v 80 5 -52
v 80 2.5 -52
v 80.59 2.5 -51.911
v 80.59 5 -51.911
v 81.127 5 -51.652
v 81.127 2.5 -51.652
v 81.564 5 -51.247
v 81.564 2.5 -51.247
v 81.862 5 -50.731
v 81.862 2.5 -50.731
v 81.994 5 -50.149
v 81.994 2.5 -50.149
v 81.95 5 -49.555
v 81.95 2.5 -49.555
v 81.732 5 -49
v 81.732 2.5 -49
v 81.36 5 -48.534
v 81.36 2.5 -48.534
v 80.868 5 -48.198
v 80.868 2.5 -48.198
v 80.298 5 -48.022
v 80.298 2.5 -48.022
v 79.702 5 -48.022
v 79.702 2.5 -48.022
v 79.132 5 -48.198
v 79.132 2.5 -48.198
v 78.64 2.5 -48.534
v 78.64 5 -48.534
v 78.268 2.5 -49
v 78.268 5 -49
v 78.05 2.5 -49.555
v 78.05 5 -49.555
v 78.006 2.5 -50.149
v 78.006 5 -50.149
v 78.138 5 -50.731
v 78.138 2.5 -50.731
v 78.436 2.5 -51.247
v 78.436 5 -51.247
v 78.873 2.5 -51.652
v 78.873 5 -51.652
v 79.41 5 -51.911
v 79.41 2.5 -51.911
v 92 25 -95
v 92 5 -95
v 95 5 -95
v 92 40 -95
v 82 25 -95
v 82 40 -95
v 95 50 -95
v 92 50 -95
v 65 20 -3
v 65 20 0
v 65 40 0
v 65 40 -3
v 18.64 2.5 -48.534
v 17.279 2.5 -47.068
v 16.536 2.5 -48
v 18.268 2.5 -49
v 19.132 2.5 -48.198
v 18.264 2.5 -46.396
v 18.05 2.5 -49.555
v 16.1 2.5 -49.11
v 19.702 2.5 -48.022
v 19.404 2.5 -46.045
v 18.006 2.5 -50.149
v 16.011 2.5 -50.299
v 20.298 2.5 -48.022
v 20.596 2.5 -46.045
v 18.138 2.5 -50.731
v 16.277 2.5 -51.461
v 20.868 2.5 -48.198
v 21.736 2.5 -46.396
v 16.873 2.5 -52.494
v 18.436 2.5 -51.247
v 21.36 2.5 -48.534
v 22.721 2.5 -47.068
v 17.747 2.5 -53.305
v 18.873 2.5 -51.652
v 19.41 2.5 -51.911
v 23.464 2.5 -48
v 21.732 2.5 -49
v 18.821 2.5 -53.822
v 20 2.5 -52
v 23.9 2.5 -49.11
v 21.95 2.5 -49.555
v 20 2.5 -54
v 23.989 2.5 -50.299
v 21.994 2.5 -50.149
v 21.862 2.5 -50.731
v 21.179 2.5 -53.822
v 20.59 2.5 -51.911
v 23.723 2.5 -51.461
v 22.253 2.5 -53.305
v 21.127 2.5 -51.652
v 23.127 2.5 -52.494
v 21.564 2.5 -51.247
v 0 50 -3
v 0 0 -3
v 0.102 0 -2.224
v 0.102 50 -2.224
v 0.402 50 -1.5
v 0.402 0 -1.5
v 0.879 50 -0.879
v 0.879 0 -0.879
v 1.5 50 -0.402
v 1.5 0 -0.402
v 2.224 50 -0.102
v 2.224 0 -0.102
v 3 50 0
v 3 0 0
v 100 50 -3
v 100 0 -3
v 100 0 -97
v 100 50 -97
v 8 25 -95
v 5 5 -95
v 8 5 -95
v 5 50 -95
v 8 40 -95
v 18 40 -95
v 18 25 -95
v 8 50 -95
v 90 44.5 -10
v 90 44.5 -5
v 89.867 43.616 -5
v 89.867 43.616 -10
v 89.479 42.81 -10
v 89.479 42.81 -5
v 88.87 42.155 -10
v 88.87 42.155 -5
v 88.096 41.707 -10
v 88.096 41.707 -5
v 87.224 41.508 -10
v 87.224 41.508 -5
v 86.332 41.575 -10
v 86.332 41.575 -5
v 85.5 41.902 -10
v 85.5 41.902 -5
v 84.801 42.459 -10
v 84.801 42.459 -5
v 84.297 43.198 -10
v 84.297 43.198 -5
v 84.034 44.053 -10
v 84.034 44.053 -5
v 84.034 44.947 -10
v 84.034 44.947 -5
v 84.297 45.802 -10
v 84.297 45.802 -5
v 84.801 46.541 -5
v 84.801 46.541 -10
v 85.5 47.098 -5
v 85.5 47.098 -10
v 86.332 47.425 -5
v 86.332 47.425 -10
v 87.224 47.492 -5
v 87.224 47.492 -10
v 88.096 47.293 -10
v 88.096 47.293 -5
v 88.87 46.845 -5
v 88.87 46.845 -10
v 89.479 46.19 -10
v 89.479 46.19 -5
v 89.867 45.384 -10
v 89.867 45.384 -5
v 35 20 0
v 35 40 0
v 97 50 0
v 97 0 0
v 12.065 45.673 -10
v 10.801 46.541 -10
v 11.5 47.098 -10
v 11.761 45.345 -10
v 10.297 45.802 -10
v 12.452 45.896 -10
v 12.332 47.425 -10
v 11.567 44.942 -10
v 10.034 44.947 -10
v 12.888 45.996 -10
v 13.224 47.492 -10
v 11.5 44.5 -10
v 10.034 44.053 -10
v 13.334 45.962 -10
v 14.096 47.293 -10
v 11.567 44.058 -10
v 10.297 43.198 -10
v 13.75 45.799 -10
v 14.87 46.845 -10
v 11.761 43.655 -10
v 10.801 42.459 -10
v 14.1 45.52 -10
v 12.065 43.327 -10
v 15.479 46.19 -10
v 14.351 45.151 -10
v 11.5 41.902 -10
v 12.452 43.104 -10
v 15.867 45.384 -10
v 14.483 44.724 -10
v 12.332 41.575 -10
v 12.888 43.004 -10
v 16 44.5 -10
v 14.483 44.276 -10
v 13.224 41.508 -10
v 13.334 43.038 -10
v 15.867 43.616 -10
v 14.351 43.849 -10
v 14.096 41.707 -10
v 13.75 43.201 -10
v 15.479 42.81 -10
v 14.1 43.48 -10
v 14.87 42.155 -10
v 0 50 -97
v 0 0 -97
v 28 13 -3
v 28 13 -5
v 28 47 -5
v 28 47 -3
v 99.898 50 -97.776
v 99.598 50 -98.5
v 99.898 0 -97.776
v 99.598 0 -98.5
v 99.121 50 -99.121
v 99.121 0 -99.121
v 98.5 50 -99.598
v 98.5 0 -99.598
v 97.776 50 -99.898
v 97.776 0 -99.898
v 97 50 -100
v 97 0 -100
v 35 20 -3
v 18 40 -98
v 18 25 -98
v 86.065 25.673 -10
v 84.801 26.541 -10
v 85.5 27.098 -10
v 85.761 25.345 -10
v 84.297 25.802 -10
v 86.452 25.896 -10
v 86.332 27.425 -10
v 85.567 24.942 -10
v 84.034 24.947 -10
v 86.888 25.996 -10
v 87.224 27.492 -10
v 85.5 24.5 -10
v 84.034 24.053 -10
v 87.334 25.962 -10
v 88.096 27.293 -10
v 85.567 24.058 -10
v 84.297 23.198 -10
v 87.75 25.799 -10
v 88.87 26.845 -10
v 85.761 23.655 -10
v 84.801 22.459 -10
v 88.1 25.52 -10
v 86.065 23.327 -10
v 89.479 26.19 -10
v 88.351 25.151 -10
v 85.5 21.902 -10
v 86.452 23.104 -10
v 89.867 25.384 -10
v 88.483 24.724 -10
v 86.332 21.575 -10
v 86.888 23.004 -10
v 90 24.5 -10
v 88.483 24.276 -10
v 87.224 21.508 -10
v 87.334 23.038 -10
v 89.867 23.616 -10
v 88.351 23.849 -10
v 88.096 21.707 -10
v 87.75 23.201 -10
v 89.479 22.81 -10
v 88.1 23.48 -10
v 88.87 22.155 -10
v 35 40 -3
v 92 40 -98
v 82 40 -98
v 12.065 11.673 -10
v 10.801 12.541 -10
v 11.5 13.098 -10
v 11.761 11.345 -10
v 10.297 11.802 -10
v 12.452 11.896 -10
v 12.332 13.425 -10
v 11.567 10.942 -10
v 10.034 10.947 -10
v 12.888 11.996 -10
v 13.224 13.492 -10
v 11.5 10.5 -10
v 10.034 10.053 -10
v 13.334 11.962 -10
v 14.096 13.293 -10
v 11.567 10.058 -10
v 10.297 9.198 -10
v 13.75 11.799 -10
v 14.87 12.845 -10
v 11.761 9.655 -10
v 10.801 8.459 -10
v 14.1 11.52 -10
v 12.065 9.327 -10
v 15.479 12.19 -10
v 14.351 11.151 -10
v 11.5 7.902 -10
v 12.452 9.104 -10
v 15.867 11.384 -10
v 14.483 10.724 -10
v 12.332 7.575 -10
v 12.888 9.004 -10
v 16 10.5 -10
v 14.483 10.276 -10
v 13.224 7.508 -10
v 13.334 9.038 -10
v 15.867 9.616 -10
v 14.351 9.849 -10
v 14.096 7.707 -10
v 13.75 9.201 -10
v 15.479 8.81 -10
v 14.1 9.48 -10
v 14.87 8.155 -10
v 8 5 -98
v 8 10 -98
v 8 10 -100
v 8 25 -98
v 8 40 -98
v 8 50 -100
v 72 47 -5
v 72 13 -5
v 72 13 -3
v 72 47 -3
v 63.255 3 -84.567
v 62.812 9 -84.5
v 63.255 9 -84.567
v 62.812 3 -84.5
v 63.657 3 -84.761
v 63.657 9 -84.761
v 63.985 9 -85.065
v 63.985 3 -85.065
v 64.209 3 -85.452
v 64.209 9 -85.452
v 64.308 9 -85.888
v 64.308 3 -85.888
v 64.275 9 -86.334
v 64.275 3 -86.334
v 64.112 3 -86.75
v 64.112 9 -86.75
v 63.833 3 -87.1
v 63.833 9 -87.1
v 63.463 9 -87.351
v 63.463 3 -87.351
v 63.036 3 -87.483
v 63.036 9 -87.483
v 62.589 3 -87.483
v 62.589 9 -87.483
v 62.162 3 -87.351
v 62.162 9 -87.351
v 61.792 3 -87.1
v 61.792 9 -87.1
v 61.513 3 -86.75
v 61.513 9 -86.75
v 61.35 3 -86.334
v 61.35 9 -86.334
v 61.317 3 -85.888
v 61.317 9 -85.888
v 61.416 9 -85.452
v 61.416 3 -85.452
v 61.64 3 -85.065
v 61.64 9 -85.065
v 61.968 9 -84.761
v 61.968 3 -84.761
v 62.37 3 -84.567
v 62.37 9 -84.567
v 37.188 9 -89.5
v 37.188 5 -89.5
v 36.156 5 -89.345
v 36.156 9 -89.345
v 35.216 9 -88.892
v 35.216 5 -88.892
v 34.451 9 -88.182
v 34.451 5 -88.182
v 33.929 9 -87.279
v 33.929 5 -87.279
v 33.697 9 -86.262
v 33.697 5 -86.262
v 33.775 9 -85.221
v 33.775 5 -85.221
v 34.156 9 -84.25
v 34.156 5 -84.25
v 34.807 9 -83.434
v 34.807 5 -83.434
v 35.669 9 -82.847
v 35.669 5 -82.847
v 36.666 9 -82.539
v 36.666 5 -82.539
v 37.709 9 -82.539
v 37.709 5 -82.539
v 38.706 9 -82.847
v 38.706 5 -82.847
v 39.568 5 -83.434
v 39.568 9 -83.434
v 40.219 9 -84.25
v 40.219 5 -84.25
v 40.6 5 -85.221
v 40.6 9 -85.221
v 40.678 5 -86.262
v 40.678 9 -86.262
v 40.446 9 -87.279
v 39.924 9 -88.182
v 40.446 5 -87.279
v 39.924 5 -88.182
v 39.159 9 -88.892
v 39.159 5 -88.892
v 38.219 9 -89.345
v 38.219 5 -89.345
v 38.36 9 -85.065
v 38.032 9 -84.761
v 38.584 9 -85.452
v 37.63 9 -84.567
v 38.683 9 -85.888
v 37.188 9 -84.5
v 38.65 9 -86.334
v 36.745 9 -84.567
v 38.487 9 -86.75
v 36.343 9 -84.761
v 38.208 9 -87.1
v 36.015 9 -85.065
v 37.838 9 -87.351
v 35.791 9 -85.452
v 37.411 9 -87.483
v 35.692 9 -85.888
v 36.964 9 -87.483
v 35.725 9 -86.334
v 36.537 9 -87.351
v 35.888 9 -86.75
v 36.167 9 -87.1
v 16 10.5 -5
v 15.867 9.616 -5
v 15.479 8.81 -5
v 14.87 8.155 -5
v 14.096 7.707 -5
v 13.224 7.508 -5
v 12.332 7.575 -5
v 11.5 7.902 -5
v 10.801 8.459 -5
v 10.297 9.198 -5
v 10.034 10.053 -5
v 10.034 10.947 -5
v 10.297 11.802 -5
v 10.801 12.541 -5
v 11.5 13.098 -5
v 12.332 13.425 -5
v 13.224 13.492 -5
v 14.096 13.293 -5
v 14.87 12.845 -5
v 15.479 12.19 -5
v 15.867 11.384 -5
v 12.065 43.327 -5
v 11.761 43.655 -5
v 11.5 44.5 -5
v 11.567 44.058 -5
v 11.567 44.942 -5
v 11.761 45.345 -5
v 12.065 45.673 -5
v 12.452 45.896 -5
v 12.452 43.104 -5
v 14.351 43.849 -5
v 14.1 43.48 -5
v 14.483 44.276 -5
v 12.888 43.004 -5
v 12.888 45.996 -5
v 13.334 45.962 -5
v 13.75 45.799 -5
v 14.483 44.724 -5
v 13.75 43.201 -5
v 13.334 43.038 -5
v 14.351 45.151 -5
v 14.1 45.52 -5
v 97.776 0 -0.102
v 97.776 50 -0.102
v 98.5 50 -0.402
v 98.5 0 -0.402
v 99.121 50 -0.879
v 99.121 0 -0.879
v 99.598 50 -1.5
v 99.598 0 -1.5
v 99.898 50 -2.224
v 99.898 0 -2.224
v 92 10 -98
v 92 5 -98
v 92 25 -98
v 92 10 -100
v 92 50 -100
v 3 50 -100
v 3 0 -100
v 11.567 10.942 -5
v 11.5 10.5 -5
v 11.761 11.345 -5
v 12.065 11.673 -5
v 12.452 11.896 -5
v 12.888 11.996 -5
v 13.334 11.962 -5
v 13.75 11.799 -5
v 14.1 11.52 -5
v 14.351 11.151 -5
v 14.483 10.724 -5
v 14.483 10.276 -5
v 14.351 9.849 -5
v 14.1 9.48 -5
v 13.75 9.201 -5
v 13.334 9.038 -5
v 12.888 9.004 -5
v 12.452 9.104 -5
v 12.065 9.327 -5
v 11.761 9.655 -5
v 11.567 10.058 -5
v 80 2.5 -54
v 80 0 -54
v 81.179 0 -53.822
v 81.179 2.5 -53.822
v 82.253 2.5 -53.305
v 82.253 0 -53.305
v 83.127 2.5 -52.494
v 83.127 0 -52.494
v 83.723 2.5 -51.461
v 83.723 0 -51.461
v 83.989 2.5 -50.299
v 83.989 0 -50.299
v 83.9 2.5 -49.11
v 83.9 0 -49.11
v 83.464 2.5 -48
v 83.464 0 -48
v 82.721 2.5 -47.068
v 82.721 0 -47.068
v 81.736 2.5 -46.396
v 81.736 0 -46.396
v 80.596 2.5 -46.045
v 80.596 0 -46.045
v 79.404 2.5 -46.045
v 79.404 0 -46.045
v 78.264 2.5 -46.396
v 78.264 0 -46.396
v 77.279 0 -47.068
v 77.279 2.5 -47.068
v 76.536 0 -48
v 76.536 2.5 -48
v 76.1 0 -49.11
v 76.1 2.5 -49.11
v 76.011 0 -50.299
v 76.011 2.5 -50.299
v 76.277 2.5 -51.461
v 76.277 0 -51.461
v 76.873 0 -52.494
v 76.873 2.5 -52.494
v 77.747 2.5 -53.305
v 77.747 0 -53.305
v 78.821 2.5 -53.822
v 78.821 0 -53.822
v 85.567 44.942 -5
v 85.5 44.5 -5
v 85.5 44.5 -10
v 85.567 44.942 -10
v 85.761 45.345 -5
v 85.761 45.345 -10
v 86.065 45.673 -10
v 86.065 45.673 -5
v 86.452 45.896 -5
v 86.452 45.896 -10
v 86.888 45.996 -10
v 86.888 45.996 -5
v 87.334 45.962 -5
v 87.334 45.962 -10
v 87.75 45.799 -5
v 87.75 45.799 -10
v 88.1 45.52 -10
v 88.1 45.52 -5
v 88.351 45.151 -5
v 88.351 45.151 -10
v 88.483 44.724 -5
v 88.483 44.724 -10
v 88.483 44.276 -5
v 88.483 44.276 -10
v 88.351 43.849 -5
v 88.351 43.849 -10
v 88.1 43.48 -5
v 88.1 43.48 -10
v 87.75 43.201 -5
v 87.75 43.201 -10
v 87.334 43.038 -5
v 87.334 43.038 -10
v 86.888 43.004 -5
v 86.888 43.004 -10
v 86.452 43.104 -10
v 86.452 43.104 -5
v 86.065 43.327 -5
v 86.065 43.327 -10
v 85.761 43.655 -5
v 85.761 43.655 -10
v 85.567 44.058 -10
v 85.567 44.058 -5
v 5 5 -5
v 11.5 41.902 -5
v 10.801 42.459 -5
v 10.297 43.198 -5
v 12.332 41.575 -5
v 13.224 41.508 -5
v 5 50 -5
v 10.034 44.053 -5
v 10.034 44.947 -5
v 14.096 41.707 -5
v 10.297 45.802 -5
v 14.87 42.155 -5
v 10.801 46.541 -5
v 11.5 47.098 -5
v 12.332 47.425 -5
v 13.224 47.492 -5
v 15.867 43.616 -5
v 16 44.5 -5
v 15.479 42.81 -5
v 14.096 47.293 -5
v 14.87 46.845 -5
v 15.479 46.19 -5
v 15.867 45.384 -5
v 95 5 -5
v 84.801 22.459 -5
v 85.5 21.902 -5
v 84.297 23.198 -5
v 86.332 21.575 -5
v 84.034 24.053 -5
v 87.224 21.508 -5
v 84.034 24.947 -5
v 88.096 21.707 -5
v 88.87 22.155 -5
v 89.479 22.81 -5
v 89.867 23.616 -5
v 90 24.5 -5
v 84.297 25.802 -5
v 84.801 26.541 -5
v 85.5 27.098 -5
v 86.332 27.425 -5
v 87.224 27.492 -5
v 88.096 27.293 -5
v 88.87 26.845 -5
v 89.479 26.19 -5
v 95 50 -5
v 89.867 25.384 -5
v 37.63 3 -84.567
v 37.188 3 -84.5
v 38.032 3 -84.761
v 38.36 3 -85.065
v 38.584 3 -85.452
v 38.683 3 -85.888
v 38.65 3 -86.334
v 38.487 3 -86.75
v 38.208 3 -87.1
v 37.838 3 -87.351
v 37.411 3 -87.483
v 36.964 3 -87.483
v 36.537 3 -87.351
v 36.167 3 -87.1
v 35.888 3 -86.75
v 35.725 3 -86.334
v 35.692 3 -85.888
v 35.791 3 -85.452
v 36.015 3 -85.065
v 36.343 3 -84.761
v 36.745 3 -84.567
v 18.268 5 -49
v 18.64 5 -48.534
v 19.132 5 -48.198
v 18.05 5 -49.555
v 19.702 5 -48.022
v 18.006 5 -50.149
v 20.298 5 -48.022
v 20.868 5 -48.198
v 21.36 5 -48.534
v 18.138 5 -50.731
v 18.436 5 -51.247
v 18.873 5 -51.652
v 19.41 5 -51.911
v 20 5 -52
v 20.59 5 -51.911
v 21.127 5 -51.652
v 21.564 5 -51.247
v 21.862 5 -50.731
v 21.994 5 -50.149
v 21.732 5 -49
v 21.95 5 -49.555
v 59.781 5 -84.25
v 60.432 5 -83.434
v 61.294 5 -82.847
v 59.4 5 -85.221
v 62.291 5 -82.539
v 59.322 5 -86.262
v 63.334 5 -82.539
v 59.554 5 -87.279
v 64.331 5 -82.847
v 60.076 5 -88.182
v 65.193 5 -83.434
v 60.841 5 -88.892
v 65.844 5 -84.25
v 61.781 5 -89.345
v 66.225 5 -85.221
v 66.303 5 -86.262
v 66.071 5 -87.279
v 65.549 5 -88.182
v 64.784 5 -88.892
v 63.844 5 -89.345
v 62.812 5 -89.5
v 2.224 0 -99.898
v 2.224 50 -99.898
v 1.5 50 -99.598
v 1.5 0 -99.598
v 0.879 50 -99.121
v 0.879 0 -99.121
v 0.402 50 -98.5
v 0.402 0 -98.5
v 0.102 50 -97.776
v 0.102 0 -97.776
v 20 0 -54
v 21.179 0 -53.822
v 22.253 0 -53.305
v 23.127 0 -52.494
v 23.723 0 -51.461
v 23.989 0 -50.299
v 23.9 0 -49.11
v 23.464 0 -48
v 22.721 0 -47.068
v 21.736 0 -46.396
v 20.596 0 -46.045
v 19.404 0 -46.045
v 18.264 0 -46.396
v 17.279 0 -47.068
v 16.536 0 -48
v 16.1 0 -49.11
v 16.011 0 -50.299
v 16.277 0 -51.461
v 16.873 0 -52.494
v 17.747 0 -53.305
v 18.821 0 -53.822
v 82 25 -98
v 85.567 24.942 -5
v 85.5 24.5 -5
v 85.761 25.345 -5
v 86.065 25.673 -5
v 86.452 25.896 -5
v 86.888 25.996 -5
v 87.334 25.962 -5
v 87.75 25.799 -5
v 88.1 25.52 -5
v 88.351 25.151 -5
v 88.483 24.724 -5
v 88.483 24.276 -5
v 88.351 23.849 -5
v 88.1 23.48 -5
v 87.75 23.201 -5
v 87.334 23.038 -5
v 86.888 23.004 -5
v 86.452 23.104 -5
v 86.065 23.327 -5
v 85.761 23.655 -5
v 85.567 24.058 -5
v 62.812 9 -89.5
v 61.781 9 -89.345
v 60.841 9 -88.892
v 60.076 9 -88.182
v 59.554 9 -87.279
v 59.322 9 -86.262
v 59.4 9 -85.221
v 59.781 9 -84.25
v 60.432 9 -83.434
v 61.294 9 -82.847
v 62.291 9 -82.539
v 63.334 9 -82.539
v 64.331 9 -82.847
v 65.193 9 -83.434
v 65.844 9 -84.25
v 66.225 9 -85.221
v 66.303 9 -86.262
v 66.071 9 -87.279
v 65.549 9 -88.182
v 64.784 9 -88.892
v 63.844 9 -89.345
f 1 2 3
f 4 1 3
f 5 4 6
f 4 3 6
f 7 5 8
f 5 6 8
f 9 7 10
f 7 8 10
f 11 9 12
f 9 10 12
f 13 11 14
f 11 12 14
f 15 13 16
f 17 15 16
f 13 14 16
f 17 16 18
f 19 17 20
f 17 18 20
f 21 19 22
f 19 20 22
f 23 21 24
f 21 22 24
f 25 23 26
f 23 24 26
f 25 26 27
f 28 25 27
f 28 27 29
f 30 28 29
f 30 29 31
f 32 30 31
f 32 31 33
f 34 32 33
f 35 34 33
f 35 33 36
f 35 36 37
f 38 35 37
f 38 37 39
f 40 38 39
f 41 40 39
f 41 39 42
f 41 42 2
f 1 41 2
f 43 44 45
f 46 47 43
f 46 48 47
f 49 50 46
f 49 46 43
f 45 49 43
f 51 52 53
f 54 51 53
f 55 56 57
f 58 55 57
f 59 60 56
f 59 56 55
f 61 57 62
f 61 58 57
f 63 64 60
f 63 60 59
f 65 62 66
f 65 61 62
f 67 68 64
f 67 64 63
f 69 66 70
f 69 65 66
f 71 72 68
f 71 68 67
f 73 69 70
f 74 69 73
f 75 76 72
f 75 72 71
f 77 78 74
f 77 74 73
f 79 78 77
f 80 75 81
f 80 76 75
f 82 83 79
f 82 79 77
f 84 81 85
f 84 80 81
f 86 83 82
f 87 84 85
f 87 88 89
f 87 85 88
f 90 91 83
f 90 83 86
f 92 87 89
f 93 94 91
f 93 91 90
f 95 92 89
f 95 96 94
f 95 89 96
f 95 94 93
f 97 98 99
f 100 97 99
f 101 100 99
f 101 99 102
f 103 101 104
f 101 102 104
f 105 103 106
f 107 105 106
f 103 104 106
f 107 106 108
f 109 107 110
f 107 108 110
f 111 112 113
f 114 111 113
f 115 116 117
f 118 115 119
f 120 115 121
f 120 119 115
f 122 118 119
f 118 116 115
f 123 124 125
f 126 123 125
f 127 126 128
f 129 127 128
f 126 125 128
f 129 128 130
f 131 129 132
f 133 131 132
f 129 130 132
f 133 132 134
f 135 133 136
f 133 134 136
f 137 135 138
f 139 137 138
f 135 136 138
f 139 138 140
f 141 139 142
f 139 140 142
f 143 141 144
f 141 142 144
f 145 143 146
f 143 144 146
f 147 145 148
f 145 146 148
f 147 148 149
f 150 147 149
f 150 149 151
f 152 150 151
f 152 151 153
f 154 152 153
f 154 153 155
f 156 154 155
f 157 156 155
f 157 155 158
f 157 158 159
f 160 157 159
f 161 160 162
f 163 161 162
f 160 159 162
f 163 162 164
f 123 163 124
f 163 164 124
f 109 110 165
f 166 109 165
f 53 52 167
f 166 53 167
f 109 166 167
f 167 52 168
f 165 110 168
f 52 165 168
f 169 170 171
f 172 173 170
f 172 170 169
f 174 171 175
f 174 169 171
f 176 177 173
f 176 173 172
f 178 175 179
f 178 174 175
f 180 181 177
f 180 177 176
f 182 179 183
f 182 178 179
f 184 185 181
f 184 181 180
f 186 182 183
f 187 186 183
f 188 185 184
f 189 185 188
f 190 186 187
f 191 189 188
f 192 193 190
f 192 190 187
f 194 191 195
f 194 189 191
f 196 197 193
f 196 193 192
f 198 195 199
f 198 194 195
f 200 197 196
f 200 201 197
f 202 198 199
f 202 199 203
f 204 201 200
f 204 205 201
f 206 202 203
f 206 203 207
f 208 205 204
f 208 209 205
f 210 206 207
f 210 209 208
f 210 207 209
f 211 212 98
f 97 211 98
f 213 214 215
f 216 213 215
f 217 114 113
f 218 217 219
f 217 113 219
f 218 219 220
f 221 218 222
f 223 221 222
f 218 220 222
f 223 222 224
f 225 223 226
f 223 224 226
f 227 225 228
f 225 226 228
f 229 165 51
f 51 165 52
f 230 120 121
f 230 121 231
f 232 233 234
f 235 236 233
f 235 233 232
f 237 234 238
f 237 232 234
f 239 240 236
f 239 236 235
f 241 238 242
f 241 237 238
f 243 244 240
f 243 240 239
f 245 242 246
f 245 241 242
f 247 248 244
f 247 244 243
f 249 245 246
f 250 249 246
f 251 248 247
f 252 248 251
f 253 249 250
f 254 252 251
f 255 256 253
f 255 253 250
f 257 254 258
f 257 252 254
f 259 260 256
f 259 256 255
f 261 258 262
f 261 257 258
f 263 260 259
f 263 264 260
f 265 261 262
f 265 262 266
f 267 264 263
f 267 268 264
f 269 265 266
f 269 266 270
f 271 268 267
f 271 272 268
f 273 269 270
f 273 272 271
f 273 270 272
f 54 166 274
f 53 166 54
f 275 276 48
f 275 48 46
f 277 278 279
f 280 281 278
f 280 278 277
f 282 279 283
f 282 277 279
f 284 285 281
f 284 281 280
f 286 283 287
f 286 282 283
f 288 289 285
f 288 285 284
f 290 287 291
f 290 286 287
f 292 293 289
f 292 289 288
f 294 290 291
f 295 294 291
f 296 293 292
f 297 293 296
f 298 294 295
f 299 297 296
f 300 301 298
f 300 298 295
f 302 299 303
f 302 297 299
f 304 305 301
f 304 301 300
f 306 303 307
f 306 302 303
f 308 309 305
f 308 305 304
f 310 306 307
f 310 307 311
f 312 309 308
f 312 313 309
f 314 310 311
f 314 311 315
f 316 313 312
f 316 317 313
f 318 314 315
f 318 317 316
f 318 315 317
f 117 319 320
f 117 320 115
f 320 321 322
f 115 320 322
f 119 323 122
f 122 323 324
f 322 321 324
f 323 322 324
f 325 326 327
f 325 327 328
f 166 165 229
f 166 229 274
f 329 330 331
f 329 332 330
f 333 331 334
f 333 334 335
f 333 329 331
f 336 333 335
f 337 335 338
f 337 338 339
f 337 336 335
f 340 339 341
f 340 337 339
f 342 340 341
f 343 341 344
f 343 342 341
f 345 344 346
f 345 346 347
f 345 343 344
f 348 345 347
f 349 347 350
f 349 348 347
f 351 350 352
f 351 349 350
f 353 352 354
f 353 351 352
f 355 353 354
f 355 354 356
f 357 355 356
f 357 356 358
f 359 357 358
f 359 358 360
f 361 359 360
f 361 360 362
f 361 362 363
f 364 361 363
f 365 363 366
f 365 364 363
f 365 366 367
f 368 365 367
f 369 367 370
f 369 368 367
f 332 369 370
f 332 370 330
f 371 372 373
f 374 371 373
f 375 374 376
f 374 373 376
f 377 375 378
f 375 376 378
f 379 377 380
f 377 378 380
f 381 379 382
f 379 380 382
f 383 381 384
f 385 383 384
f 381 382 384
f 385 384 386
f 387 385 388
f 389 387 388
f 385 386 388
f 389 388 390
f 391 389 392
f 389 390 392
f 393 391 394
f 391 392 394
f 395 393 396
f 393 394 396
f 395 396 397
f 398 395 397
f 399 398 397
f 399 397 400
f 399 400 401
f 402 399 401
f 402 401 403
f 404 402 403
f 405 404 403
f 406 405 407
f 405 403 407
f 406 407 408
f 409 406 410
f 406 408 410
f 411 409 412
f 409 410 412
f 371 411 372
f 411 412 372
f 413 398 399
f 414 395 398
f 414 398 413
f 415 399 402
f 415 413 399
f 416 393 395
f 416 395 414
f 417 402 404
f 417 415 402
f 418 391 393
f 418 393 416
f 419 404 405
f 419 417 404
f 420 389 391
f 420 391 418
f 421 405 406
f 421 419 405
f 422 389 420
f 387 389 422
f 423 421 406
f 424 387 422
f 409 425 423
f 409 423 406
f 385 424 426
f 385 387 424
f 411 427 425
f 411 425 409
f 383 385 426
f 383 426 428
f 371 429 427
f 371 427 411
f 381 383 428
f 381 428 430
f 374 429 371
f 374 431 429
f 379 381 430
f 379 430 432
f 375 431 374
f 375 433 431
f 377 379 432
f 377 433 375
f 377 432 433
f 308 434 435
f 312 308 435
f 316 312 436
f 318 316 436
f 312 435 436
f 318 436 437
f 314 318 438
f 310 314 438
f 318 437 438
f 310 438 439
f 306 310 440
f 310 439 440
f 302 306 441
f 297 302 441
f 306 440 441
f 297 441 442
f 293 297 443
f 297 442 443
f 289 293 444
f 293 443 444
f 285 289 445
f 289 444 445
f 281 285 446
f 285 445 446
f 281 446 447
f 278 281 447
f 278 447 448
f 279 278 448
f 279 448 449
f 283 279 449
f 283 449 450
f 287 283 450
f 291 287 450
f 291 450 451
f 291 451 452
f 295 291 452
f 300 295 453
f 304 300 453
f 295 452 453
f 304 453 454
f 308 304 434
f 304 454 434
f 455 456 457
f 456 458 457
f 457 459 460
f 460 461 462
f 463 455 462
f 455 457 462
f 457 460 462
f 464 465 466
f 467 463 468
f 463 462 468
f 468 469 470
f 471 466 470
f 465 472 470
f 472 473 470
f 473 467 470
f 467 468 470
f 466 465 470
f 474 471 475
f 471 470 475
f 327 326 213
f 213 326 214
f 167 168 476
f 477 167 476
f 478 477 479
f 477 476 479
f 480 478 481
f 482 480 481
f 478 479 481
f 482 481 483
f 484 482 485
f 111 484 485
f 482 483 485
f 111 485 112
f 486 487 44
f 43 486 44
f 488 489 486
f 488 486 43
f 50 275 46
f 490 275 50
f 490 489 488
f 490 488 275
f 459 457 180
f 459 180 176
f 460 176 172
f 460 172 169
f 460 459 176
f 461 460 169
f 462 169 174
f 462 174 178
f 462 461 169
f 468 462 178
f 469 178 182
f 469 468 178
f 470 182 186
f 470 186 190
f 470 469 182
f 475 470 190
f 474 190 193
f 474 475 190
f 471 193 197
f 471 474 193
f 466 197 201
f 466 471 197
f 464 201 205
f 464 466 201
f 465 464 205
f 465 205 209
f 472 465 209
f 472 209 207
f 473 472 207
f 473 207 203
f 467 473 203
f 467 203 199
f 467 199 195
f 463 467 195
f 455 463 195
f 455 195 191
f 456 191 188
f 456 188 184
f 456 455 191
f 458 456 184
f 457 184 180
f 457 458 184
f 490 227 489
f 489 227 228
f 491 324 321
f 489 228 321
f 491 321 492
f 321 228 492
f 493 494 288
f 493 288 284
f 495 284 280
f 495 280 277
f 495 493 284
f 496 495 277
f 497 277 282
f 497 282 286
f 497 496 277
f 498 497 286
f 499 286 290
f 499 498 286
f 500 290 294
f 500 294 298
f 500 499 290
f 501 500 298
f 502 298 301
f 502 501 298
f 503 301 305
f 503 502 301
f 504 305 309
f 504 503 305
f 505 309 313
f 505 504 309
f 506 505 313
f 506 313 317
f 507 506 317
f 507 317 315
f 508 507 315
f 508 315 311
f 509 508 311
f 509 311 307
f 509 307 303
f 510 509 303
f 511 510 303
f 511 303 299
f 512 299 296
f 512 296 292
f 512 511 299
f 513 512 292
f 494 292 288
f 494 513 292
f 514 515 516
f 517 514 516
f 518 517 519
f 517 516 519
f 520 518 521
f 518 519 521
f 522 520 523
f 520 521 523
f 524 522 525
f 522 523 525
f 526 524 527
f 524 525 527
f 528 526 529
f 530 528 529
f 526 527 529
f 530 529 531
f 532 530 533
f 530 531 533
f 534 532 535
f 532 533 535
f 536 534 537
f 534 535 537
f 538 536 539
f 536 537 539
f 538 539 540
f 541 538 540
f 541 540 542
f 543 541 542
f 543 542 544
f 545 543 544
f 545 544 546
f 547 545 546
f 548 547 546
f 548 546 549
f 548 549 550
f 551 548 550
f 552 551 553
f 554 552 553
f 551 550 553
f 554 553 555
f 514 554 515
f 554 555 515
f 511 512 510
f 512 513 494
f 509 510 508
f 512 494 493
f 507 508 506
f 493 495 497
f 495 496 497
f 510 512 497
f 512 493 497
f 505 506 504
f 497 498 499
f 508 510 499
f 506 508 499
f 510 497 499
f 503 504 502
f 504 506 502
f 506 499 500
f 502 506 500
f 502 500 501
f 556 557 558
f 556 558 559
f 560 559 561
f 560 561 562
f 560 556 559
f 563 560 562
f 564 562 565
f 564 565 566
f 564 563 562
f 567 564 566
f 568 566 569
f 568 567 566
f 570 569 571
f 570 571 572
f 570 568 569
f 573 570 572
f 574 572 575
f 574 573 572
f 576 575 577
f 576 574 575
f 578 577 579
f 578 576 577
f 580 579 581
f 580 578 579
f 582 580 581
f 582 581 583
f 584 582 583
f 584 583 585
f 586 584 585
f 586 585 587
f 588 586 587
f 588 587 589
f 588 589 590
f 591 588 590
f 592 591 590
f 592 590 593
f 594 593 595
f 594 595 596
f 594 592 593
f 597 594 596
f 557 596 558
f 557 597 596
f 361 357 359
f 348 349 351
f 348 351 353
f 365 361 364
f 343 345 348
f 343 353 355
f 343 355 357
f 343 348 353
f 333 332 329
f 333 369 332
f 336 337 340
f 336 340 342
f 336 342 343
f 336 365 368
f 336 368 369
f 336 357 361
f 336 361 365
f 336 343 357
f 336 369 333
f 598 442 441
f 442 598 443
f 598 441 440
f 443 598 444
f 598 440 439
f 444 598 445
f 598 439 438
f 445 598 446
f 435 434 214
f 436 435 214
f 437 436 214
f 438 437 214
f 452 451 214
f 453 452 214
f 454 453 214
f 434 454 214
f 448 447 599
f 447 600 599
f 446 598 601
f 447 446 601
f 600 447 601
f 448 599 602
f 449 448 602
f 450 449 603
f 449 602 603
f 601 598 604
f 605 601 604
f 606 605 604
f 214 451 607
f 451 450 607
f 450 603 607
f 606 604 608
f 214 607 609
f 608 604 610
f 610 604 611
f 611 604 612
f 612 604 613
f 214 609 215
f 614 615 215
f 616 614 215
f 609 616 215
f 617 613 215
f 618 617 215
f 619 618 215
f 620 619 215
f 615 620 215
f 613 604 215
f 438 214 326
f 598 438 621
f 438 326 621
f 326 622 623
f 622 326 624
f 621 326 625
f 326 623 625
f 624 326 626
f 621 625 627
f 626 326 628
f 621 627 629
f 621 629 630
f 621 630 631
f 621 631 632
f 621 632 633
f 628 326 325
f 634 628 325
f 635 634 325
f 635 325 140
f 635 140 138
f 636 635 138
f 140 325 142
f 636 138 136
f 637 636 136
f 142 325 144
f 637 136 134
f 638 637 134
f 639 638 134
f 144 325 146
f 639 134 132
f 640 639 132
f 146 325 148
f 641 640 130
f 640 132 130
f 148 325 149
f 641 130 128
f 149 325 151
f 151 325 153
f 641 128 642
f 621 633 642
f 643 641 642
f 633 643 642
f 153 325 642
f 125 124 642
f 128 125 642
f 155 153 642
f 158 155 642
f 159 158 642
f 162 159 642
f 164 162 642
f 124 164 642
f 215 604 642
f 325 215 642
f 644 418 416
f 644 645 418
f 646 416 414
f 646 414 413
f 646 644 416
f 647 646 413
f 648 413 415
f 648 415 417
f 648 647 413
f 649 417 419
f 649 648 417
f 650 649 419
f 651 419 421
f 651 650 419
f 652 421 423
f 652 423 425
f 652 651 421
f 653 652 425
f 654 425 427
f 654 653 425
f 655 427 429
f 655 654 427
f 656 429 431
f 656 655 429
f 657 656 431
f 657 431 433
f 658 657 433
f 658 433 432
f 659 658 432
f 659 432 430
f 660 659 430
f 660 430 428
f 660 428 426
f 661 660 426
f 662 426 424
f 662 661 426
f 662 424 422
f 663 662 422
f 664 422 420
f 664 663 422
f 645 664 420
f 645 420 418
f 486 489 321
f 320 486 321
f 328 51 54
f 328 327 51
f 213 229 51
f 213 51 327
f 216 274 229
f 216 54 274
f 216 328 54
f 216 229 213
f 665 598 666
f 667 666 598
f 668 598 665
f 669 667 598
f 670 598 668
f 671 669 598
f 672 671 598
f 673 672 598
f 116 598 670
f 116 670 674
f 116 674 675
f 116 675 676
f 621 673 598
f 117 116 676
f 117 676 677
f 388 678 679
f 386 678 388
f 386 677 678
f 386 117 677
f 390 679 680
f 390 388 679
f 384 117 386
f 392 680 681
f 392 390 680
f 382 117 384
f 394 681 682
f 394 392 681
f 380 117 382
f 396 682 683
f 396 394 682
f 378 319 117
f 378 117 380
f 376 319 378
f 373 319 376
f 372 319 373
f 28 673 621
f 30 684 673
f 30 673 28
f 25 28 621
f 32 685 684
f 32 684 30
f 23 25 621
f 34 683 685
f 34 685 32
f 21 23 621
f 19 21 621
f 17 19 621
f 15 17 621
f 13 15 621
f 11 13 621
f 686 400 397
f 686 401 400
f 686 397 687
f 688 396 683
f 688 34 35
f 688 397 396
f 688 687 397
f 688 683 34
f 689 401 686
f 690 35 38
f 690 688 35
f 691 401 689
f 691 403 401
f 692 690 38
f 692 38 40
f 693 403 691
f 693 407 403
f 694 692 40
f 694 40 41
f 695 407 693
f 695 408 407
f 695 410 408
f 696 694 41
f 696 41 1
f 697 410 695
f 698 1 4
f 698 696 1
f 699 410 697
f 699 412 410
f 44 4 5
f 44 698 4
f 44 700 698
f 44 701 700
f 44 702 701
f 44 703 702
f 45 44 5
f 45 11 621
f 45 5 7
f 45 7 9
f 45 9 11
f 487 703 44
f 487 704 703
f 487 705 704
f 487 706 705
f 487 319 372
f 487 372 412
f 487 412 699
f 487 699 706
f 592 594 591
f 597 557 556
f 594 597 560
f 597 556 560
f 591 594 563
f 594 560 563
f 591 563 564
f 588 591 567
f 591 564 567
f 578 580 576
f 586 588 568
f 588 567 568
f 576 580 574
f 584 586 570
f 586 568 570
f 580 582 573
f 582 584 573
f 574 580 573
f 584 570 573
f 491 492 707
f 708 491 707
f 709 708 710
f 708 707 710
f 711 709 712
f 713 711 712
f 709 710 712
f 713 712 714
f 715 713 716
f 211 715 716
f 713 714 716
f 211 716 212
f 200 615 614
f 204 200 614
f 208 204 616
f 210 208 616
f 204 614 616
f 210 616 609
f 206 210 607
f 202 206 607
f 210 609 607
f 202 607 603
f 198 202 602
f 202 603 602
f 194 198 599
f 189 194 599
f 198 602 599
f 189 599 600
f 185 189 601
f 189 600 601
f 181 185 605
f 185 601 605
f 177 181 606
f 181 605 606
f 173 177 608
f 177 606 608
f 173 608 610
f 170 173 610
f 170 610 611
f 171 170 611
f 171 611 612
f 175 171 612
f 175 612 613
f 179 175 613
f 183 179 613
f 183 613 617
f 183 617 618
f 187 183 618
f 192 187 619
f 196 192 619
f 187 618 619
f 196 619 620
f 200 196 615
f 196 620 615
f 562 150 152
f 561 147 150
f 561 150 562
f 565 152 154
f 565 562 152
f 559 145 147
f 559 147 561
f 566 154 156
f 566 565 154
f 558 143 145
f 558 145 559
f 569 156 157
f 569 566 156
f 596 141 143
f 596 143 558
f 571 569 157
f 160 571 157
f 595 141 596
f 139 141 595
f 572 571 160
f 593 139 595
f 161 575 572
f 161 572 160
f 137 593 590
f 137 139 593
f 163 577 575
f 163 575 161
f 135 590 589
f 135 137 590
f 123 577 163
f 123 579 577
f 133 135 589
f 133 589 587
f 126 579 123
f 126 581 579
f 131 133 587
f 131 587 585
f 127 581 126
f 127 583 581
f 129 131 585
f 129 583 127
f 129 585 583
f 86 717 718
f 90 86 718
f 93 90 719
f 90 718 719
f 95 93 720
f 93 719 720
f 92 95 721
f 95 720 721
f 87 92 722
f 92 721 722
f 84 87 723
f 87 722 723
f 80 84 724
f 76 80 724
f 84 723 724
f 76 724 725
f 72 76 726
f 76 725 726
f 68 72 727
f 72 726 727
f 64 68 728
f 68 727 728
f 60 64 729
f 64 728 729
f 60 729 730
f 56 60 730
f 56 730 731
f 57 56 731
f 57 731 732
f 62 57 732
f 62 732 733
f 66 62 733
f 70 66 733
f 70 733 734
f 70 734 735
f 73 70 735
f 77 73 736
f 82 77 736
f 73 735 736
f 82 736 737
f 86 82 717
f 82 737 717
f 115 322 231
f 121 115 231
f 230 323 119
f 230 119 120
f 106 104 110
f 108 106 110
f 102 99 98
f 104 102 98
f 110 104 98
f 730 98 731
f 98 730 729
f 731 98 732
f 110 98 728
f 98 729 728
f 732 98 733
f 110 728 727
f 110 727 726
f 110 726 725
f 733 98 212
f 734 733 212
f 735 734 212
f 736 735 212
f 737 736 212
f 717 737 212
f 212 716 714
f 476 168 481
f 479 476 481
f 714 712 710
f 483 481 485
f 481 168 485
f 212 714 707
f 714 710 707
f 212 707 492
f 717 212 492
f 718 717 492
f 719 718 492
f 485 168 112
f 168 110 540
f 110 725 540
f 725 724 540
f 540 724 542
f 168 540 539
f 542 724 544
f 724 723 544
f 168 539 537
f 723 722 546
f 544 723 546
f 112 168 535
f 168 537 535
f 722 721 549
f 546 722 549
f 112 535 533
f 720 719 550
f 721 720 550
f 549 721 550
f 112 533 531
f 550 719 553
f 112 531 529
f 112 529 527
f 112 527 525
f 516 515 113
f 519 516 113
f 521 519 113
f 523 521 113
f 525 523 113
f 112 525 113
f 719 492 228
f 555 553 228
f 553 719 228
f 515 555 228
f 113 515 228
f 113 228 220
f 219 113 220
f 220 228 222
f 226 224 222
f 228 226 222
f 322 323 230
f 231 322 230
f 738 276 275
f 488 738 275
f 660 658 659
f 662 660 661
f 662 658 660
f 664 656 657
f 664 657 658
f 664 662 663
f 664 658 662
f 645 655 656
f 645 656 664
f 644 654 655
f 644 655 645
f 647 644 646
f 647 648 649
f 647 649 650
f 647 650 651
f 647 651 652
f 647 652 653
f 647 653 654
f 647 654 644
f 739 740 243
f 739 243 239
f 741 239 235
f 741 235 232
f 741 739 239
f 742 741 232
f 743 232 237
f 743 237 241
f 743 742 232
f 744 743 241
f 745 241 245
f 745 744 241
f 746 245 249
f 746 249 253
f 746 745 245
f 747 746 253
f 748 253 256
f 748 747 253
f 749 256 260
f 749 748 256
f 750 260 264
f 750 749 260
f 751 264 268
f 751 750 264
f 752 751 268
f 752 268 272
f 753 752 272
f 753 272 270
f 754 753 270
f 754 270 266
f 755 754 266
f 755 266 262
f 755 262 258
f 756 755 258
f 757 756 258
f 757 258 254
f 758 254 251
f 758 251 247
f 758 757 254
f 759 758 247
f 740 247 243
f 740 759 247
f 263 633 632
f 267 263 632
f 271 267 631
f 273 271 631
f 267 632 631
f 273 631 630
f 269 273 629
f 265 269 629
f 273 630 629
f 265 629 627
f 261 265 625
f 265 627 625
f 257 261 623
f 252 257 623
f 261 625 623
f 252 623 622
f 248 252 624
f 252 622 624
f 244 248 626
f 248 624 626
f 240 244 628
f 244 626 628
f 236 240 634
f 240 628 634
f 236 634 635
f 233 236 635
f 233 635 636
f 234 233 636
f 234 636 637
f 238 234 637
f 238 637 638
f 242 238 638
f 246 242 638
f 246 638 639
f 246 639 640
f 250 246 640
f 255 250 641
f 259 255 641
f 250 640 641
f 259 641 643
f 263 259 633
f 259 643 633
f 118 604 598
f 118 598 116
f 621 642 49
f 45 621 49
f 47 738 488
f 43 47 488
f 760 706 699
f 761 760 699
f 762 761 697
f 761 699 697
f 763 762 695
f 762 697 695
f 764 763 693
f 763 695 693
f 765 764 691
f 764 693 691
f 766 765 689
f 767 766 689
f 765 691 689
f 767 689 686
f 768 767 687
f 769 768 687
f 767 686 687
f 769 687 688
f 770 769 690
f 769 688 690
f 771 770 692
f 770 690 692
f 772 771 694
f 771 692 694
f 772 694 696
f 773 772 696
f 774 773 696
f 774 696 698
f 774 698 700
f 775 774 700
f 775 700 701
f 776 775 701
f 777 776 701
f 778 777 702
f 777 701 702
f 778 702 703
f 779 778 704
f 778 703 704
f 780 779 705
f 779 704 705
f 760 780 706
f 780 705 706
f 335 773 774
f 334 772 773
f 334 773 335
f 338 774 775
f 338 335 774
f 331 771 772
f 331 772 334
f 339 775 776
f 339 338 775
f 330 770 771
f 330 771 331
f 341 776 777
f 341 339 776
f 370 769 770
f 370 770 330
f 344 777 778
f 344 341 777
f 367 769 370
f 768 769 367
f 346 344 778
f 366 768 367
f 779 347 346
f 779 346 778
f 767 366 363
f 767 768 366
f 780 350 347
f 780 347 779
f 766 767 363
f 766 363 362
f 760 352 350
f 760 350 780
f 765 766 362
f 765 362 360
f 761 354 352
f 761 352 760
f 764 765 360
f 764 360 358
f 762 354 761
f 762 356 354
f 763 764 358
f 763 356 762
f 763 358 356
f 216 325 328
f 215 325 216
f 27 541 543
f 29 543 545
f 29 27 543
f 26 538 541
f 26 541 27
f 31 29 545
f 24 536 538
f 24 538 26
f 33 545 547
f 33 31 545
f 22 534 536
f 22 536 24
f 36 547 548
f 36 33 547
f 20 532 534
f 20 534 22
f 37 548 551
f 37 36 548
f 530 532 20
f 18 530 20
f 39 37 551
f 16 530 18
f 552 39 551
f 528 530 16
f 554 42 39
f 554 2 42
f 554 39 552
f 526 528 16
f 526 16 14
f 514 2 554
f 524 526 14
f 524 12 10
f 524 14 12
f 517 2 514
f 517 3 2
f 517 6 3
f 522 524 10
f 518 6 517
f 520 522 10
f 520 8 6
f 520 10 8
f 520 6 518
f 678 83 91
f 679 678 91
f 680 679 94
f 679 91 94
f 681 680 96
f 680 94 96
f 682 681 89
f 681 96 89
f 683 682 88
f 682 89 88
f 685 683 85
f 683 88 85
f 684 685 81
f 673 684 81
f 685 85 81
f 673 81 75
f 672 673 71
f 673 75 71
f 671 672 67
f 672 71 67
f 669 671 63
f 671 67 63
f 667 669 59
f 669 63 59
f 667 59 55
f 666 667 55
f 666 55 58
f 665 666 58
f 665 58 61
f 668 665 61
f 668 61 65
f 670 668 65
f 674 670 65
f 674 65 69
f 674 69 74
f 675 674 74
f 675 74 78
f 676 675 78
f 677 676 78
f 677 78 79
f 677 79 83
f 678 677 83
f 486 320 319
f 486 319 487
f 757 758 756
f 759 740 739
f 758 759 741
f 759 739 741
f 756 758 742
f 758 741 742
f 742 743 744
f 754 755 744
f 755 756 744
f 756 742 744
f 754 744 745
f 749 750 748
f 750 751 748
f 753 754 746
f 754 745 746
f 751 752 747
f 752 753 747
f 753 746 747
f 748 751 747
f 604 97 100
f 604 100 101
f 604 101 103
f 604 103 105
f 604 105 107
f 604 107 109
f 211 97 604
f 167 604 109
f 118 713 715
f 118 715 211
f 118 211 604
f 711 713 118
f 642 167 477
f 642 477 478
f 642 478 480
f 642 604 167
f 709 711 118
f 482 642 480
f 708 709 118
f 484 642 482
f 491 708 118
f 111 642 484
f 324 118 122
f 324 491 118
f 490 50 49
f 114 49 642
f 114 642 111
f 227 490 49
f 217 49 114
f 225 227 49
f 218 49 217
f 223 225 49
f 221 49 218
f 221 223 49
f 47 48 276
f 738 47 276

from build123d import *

# Parameters (mm, degrees)
EXTRUDE_355_DEPTH      = 50
SKETCH_2_W             = 90
SKETCH_2_H             = 90
CUT_EXTRUDE_705_DEPTH  = 45
SKETCH_3_R             = 3.5
SKETCH_3_R_2           = 1.5
TYPE_C_DEPTH           = 4
TYPE_C_START           = -2
SKETCH_3_2_R           = 1.5
TYPE_C_2_DEPTH         = 2
SKETCH_4_W             = 36.625
SKETCH_4_H             = 10
TYPE_C_3_DEPTH         = 3
SKETCH_5_W             = 10
SKETCH_5_H             = 5
TYPE_C_4_DEPTH         = 2
SKETCH_6_R             = 3
SKETCH_6_R_2           = 1.5
EXTRUDE_2034_DEPTH     = 5
SKETCH_7_W             = 30
SKETCH_7_H             = 20
OLED_DEPTH             = 5
SKETCH_8_W             = 44
SKETCH_8_H             = 34
OLED_2_DEPTH           = 2
SKETCH_9_R             = 4
SKETCH_9_R_2           = 2
CUT_EXTRUDE_2931_DEPTH = 2.5
SKETCH_9_2_R           = 2
CUT_EXTRUDE_2975_DEPTH = 5
SKETCH_10_W            = 84
SKETCH_10_H            = 40
CUT_EXTRUDE_9_DEPTH    = 5
SKETCH_11_W            = 23.6875
SKETCH_11_H            = 3
CUT_EXTRUDE_10_DEPTH   = 2
SKETCH_12_W            = 84
SKETCH_12_H            = 3
CUT_EXTRUDE_11_DEPTH   = 3
SKETCH_14_W            = 10
SKETCH_14_H            = 3
EXTRUDE_1_DEPTH        = 25
SKETCH_14_2_W          = 10
SKETCH_14_2_H          = 3
CUT_EXTRUDE_12_DEPTH   = 10


with BuildPart() as part:
    # 草图1 → Extrude 355 (new body)
    with BuildSketch(Plane(origin=(0, 0, 0), x_dir=(1, 0, 0), z_dir=(0, 1, 0))):
        with BuildLine():
            Line((3, 0), (97, 0))
            ThreePointArc((97, 0), (99.121320344, 0.878679656), (100, 3))
            Line((100, 3), (100, 97))
            ThreePointArc((100, 97), (99.121320344, 99.121320344), (97, 100))
            Line((97, 100), (3, 100))
            ThreePointArc((3, 100), (0.878679656, 99.121320344), (0, 97))
            Line((0, 97), (0, 3))
            ThreePointArc((0, 3), (0.878679656, 0.878679656), (3, 0))
        make_face()
    extrude(amount=EXTRUDE_355_DEPTH)

    # 草图2 → Cut-Extrude 705 (cut)
    with BuildSketch(Plane(origin=(0, 50, 0), x_dir=(1, 0, 0), z_dir=(0, 1, 0))):
        with Locations((50, 50)):
            Rectangle(SKETCH_2_W, SKETCH_2_H)
    extrude(amount=-CUT_EXTRUDE_705_DEPTH, mode=Mode.SUBTRACT)

    # 草图3 → TYPE-C (add)
    # profile 1 of 2: a face of its own
    with BuildSketch(Plane(origin=(0, 5, 0), x_dir=(1, 0, 0), z_dir=(0, 1, 0))):
        with Locations(Location((37.1875, 86, 0), (0, 0, 90))):
            Circle(SKETCH_3_R)
        with Locations(Location((37.1875, 86, 0), (0, 0, 270))):
            Circle(SKETCH_3_R_2, mode=Mode.SUBTRACT)
    # profile 2 of 2: a face of its own
    with BuildSketch(Plane(origin=(0, 5, 0), x_dir=(1, 0, 0), z_dir=(0, 1, 0))):
        with Locations(Location((62.8125, 86, 0), (0, 0, 90))):
            Circle(SKETCH_3_R)
        with Locations(Location((62.8125, 86, 0), (0, 0, 270))):
            Circle(SKETCH_3_R_2, mode=Mode.SUBTRACT)
    extrude(amount=TYPE_C_DEPTH)

    # 草图3<2> → TYPE-C 2 (cut)
    with BuildSketch(Plane(origin=(0, 5, 0), x_dir=(1, 0, 0), z_dir=(0, 1, 0)).offset(TYPE_C_START)):
        with Locations(Location((37.1875, 86, 0), (0, 0, 270))):
            Circle(SKETCH_3_2_R)
        with Locations(Location((62.8125, 86, 0), (0, 0, 270))):
            Circle(SKETCH_3_2_R)
    extrude(amount=TYPE_C_2_DEPTH, mode=Mode.SUBTRACT)

    # 草图4 → TYPE-C 3 (cut)
    with BuildSketch(Plane.XY.offset(-95)):
        with Locations((50, 13)):
            Rectangle(SKETCH_4_W, SKETCH_4_H)
    extrude(amount=-TYPE_C_3_DEPTH, mode=Mode.SUBTRACT)

    # 草图5 → TYPE-C 4 (cut)
    with BuildSketch(Plane.XY.offset(-98)):
        with Locations((50, 12.5)):
            Rectangle(SKETCH_5_W, SKETCH_5_H)
    extrude(amount=-TYPE_C_4_DEPTH, mode=Mode.SUBTRACT)

    # 草图6 → Extrude 2034 (add)
    # profile 1 of 4: a face of its own
    with BuildSketch(Plane(origin=(0, 0, -5), x_dir=(-1, 0, 0), z_dir=(0, 0, -1))):
        with Locations(Location((-87, 44.5, 0), (0, 0, 180))):
            Circle(SKETCH_6_R)
        with Locations((-87, 44.5)):
            Circle(SKETCH_6_R_2, mode=Mode.SUBTRACT)
    # profile 2 of 4: a face of its own
    with BuildSketch(Plane(origin=(0, 0, -5), x_dir=(-1, 0, 0), z_dir=(0, 0, -1))):
        with Locations(Location((-87, 24.5, 0), (0, 0, 180))):
            Circle(SKETCH_6_R)
        with Locations((-87, 24.5)):
            Circle(SKETCH_6_R_2, mode=Mode.SUBTRACT)
    # profile 3 of 4: a face of its own
    with BuildSketch(Plane(origin=(0, 0, -5), x_dir=(-1, 0, 0), z_dir=(0, 0, -1))):
        with Locations(Location((-13, 44.5, 0), (0, 0, 180))):
            Circle(SKETCH_6_R)
        with Locations((-13, 44.5)):
            Circle(SKETCH_6_R_2, mode=Mode.SUBTRACT)
    # profile 4 of 4: a face of its own
    with BuildSketch(Plane(origin=(0, 0, -5), x_dir=(-1, 0, 0), z_dir=(0, 0, -1))):
        with Locations(Location((-13, 10.5, 0), (0, 0, 180))):
            Circle(SKETCH_6_R)
        with Locations((-13, 10.5)):
            Circle(SKETCH_6_R_2, mode=Mode.SUBTRACT)
    extrude(amount=EXTRUDE_2034_DEPTH)

    # 草图7 → OLED (cut)
    with BuildSketch(Plane.XY):
        with Locations((50, 30)):
            Rectangle(SKETCH_7_W, SKETCH_7_H)
    extrude(amount=-OLED_DEPTH, mode=Mode.SUBTRACT)

    # 草图8 → OLED 2 (cut)
    with BuildSketch(Plane(origin=(0, 0, -5), x_dir=(-1, 0, 0), z_dir=(0, 0, -1))):
        with Locations((-50, 30)):
            Rectangle(SKETCH_8_W, SKETCH_8_H)
    extrude(amount=-OLED_2_DEPTH, mode=Mode.SUBTRACT)

    # 草图9 → Cut-Extrude 2931 (cut)
    # profile 1 of 2: a face of its own
    with BuildSketch(Plane.XZ):
        with Locations(Location((80, -50, 0), (0, 0, 270))):
            Circle(SKETCH_9_R)
        with Locations(Location((80, -50, 0), (0, 0, 270))):
            Circle(SKETCH_9_R_2, mode=Mode.SUBTRACT)
    # profile 2 of 2: a face of its own
    with BuildSketch(Plane.XZ):
        with Locations(Location((20, -50, 0), (0, 0, 270))):
            Circle(SKETCH_9_R)
        with Locations(Location((20, -50, 0), (0, 0, 270))):
            Circle(SKETCH_9_R_2, mode=Mode.SUBTRACT)
    extrude(amount=-CUT_EXTRUDE_2931_DEPTH, mode=Mode.SUBTRACT)

    # 草图9<2> → Cut-Extrude 2975 (cut)
    with BuildSketch(Plane.XZ):
        with Locations(Location((80, -50, 0), (0, 0, 270))):
            Circle(SKETCH_9_2_R)
        with Locations(Location((20, -50, 0), (0, 0, 270))):
            Circle(SKETCH_9_2_R)
    extrude(amount=-CUT_EXTRUDE_2975_DEPTH, mode=Mode.SUBTRACT)

    # 草图10 → 切除-拉伸9 (cut)
    with BuildSketch(Plane(origin=(0, 0, -100), x_dir=(-1, 0, 0), z_dir=(0, 0, -1))):
        with Locations((-50, 30)):
            Rectangle(SKETCH_10_W, SKETCH_10_H)
    extrude(amount=-CUT_EXTRUDE_9_DEPTH, mode=Mode.SUBTRACT)

    # 草图11 → 切除-拉伸10 (cut)
    with BuildSketch(Plane(origin=(0, 10, 0), x_dir=(1, 0, 0), z_dir=(0, 1, 0))):
        with Locations((80.15625, 96.5)):
            Rectangle(SKETCH_11_W, SKETCH_11_H)
        with Locations((19.84375, 96.5)):
            Rectangle(SKETCH_11_W, SKETCH_11_H)
    extrude(amount=-CUT_EXTRUDE_10_DEPTH, mode=Mode.SUBTRACT)

    # 草图12 → 切除-拉伸11 (cut)
    with BuildSketch(Plane(origin=(0, 8, 0), x_dir=(1, 0, 0), z_dir=(0, 1, 0))):
        with Locations((50, 96.5)):
            Rectangle(SKETCH_12_W, SKETCH_12_H)
    extrude(amount=-CUT_EXTRUDE_11_DEPTH, mode=Mode.SUBTRACT)

    # 草图14 → 凸台-拉伸1 (add)
    with BuildSketch(Plane(origin=(0, 50, 0), x_dir=(1, 0, 0), z_dir=(0, 1, 0))):
        with Locations((13, 96.5)):
            Rectangle(SKETCH_14_W, SKETCH_14_H)
        with Locations((87, 96.5)):
            Rectangle(SKETCH_14_W, SKETCH_14_H)
    extrude(amount=-EXTRUDE_1_DEPTH)

    # 草图14<2> → 切除-拉伸12 (cut)
    with BuildSketch(Plane(origin=(0, 50, 0), x_dir=(1, 0, 0), z_dir=(0, 1, 0))):
        with Locations((13, 96.5)):
            Rectangle(SKETCH_14_2_W, SKETCH_14_2_H)
        with Locations((87, 96.5)):
            Rectangle(SKETCH_14_2_W, SKETCH_14_2_H)
    extrude(amount=-CUT_EXTRUDE_12_DEPTH, mode=Mode.SUBTRACT)


solid = part.part
